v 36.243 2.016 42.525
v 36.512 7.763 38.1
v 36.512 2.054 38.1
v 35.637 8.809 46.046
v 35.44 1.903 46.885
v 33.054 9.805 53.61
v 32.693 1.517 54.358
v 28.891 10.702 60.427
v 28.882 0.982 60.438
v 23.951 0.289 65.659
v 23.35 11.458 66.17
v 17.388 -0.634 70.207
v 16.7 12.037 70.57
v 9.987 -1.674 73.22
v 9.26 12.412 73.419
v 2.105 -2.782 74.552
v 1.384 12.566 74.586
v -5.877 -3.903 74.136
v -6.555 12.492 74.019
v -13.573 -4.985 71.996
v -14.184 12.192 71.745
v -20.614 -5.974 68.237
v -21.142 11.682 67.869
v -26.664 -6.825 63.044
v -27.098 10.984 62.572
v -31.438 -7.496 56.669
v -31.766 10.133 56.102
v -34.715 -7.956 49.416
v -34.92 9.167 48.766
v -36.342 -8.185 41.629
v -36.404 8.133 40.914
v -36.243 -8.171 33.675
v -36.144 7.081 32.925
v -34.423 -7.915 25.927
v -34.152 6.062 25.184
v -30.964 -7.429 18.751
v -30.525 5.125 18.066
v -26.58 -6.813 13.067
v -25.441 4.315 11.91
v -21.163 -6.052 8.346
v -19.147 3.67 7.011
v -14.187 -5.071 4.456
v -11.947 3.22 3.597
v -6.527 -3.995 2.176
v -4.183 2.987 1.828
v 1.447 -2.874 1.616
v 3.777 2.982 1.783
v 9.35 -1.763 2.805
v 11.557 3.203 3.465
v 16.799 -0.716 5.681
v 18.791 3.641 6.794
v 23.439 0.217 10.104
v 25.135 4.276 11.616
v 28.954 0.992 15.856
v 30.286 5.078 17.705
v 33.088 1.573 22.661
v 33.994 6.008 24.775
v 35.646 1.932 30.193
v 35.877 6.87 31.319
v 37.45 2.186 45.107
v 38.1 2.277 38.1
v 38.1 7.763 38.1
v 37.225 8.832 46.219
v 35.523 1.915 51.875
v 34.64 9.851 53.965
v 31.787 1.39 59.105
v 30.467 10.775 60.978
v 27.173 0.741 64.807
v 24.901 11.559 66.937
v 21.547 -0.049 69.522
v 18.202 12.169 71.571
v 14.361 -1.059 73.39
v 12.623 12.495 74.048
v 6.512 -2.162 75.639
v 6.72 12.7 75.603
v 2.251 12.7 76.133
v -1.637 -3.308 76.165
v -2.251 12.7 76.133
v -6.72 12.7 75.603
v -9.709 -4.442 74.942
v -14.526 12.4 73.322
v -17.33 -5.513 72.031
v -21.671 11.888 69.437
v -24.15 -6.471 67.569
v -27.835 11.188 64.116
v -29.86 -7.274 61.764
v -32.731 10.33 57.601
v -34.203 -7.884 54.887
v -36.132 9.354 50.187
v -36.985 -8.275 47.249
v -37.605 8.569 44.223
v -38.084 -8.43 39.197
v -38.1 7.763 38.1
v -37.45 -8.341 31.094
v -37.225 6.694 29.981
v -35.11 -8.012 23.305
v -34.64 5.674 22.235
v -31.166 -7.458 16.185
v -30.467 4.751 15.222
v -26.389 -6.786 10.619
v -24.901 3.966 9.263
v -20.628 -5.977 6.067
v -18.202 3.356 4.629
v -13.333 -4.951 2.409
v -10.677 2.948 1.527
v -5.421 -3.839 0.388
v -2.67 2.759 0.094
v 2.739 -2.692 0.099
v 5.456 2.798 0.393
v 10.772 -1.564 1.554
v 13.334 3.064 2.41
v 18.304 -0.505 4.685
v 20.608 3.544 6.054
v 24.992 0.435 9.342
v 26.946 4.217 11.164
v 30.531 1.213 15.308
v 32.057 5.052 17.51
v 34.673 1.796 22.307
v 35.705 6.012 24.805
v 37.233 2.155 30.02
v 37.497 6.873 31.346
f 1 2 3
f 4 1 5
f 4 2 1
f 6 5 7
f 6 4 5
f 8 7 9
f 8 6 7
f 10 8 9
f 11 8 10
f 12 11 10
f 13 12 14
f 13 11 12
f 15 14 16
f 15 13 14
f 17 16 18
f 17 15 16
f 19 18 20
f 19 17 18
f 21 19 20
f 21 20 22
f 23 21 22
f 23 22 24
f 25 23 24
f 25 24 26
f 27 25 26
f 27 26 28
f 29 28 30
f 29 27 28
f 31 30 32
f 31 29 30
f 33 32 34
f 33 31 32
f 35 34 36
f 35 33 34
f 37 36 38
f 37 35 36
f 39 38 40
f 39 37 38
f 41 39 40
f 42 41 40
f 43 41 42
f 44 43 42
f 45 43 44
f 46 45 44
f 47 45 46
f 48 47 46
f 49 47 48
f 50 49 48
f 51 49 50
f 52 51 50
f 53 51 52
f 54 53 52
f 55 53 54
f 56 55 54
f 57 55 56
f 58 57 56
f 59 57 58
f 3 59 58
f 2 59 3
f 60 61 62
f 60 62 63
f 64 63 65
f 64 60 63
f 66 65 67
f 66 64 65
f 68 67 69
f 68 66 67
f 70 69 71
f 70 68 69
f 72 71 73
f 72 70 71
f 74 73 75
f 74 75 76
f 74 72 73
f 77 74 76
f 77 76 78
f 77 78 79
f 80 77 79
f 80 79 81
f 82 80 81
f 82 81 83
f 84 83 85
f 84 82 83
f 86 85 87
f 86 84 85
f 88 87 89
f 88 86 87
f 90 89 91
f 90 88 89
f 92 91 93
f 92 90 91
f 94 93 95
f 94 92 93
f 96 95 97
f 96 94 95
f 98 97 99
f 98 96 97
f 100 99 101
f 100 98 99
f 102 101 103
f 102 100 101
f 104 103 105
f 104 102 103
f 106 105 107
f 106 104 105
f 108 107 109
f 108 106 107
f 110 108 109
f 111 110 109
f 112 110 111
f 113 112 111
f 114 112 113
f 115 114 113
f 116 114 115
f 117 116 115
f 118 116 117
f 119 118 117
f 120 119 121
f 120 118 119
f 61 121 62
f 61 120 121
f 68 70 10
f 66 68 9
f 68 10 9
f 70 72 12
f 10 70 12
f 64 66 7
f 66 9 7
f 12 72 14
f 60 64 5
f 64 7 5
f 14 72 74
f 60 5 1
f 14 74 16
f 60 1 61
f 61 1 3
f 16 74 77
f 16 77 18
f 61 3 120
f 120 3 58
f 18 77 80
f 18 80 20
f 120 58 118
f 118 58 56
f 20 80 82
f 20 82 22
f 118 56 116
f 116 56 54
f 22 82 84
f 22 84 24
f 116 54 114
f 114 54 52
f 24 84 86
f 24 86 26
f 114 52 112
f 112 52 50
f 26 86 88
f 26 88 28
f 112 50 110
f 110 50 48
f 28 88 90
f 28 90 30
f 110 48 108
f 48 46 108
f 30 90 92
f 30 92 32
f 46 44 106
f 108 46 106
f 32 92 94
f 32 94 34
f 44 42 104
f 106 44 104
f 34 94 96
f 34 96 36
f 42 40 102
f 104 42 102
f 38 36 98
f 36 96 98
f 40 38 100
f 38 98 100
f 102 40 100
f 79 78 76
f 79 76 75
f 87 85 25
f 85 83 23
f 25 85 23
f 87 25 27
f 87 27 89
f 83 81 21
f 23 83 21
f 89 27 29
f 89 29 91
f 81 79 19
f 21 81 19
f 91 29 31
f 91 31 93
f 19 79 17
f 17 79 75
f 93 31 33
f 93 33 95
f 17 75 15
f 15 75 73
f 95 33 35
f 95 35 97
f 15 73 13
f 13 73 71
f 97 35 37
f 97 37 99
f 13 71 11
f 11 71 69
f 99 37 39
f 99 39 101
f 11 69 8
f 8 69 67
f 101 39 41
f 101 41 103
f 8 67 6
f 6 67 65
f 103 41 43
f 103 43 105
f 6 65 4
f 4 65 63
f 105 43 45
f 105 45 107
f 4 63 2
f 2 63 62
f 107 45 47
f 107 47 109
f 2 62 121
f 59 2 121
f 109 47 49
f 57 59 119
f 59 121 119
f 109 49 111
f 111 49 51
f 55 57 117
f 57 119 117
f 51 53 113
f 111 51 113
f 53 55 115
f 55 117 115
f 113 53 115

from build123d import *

# Parameters (mm, degrees)
F0_R     = 38.1
F0_R_2   = 36.5125
F1_DEPTH = 12.7
F5_DEPTH = 38.1
F8_DEPTH = 50.8


with BuildPart() as f1:
    # F0 (on Front) → F1 (new body, symmetric)
    with BuildSketch(Plane.XZ):
        with Locations((0, 38.1)):
            Circle(F0_R)
        with Locations((0, 38.1)):
            Circle(F0_R_2, mode=Mode.SUBTRACT)
    extrude(amount=F1_DEPTH, both=True)

    # F4 (on Right) → F5 (cut, symmetric)
    with BuildSketch(Plane.YZ):
        Polygon((12.7786435187, -8.8192215189), (12.7786435187, 76.2), (1.5856506628, -8.8192215189), align=None)
    extrude(amount=F5_DEPTH, both=True, mode=Mode.SUBTRACT)

    # F7 (on offset) → F8 (cut, symmetric)
    with BuildSketch(Plane(origin=(2.1557702546, 0.302973751, 0), x_dir=(0.139173101, -0.9902680687, 0), z_dir=(-0.9902680687, -0.139173101, 0))):
        Polygon((31.6142430529, 76.0232245399), (3.0474591767, 76.5205744021), (3.0474591767, -2.2310584007), (31.6142430529, -2.2310584007), align=None)
    extrude(amount=F8_DEPTH, both=True, mode=Mode.SUBTRACT)


solid = f1.part
